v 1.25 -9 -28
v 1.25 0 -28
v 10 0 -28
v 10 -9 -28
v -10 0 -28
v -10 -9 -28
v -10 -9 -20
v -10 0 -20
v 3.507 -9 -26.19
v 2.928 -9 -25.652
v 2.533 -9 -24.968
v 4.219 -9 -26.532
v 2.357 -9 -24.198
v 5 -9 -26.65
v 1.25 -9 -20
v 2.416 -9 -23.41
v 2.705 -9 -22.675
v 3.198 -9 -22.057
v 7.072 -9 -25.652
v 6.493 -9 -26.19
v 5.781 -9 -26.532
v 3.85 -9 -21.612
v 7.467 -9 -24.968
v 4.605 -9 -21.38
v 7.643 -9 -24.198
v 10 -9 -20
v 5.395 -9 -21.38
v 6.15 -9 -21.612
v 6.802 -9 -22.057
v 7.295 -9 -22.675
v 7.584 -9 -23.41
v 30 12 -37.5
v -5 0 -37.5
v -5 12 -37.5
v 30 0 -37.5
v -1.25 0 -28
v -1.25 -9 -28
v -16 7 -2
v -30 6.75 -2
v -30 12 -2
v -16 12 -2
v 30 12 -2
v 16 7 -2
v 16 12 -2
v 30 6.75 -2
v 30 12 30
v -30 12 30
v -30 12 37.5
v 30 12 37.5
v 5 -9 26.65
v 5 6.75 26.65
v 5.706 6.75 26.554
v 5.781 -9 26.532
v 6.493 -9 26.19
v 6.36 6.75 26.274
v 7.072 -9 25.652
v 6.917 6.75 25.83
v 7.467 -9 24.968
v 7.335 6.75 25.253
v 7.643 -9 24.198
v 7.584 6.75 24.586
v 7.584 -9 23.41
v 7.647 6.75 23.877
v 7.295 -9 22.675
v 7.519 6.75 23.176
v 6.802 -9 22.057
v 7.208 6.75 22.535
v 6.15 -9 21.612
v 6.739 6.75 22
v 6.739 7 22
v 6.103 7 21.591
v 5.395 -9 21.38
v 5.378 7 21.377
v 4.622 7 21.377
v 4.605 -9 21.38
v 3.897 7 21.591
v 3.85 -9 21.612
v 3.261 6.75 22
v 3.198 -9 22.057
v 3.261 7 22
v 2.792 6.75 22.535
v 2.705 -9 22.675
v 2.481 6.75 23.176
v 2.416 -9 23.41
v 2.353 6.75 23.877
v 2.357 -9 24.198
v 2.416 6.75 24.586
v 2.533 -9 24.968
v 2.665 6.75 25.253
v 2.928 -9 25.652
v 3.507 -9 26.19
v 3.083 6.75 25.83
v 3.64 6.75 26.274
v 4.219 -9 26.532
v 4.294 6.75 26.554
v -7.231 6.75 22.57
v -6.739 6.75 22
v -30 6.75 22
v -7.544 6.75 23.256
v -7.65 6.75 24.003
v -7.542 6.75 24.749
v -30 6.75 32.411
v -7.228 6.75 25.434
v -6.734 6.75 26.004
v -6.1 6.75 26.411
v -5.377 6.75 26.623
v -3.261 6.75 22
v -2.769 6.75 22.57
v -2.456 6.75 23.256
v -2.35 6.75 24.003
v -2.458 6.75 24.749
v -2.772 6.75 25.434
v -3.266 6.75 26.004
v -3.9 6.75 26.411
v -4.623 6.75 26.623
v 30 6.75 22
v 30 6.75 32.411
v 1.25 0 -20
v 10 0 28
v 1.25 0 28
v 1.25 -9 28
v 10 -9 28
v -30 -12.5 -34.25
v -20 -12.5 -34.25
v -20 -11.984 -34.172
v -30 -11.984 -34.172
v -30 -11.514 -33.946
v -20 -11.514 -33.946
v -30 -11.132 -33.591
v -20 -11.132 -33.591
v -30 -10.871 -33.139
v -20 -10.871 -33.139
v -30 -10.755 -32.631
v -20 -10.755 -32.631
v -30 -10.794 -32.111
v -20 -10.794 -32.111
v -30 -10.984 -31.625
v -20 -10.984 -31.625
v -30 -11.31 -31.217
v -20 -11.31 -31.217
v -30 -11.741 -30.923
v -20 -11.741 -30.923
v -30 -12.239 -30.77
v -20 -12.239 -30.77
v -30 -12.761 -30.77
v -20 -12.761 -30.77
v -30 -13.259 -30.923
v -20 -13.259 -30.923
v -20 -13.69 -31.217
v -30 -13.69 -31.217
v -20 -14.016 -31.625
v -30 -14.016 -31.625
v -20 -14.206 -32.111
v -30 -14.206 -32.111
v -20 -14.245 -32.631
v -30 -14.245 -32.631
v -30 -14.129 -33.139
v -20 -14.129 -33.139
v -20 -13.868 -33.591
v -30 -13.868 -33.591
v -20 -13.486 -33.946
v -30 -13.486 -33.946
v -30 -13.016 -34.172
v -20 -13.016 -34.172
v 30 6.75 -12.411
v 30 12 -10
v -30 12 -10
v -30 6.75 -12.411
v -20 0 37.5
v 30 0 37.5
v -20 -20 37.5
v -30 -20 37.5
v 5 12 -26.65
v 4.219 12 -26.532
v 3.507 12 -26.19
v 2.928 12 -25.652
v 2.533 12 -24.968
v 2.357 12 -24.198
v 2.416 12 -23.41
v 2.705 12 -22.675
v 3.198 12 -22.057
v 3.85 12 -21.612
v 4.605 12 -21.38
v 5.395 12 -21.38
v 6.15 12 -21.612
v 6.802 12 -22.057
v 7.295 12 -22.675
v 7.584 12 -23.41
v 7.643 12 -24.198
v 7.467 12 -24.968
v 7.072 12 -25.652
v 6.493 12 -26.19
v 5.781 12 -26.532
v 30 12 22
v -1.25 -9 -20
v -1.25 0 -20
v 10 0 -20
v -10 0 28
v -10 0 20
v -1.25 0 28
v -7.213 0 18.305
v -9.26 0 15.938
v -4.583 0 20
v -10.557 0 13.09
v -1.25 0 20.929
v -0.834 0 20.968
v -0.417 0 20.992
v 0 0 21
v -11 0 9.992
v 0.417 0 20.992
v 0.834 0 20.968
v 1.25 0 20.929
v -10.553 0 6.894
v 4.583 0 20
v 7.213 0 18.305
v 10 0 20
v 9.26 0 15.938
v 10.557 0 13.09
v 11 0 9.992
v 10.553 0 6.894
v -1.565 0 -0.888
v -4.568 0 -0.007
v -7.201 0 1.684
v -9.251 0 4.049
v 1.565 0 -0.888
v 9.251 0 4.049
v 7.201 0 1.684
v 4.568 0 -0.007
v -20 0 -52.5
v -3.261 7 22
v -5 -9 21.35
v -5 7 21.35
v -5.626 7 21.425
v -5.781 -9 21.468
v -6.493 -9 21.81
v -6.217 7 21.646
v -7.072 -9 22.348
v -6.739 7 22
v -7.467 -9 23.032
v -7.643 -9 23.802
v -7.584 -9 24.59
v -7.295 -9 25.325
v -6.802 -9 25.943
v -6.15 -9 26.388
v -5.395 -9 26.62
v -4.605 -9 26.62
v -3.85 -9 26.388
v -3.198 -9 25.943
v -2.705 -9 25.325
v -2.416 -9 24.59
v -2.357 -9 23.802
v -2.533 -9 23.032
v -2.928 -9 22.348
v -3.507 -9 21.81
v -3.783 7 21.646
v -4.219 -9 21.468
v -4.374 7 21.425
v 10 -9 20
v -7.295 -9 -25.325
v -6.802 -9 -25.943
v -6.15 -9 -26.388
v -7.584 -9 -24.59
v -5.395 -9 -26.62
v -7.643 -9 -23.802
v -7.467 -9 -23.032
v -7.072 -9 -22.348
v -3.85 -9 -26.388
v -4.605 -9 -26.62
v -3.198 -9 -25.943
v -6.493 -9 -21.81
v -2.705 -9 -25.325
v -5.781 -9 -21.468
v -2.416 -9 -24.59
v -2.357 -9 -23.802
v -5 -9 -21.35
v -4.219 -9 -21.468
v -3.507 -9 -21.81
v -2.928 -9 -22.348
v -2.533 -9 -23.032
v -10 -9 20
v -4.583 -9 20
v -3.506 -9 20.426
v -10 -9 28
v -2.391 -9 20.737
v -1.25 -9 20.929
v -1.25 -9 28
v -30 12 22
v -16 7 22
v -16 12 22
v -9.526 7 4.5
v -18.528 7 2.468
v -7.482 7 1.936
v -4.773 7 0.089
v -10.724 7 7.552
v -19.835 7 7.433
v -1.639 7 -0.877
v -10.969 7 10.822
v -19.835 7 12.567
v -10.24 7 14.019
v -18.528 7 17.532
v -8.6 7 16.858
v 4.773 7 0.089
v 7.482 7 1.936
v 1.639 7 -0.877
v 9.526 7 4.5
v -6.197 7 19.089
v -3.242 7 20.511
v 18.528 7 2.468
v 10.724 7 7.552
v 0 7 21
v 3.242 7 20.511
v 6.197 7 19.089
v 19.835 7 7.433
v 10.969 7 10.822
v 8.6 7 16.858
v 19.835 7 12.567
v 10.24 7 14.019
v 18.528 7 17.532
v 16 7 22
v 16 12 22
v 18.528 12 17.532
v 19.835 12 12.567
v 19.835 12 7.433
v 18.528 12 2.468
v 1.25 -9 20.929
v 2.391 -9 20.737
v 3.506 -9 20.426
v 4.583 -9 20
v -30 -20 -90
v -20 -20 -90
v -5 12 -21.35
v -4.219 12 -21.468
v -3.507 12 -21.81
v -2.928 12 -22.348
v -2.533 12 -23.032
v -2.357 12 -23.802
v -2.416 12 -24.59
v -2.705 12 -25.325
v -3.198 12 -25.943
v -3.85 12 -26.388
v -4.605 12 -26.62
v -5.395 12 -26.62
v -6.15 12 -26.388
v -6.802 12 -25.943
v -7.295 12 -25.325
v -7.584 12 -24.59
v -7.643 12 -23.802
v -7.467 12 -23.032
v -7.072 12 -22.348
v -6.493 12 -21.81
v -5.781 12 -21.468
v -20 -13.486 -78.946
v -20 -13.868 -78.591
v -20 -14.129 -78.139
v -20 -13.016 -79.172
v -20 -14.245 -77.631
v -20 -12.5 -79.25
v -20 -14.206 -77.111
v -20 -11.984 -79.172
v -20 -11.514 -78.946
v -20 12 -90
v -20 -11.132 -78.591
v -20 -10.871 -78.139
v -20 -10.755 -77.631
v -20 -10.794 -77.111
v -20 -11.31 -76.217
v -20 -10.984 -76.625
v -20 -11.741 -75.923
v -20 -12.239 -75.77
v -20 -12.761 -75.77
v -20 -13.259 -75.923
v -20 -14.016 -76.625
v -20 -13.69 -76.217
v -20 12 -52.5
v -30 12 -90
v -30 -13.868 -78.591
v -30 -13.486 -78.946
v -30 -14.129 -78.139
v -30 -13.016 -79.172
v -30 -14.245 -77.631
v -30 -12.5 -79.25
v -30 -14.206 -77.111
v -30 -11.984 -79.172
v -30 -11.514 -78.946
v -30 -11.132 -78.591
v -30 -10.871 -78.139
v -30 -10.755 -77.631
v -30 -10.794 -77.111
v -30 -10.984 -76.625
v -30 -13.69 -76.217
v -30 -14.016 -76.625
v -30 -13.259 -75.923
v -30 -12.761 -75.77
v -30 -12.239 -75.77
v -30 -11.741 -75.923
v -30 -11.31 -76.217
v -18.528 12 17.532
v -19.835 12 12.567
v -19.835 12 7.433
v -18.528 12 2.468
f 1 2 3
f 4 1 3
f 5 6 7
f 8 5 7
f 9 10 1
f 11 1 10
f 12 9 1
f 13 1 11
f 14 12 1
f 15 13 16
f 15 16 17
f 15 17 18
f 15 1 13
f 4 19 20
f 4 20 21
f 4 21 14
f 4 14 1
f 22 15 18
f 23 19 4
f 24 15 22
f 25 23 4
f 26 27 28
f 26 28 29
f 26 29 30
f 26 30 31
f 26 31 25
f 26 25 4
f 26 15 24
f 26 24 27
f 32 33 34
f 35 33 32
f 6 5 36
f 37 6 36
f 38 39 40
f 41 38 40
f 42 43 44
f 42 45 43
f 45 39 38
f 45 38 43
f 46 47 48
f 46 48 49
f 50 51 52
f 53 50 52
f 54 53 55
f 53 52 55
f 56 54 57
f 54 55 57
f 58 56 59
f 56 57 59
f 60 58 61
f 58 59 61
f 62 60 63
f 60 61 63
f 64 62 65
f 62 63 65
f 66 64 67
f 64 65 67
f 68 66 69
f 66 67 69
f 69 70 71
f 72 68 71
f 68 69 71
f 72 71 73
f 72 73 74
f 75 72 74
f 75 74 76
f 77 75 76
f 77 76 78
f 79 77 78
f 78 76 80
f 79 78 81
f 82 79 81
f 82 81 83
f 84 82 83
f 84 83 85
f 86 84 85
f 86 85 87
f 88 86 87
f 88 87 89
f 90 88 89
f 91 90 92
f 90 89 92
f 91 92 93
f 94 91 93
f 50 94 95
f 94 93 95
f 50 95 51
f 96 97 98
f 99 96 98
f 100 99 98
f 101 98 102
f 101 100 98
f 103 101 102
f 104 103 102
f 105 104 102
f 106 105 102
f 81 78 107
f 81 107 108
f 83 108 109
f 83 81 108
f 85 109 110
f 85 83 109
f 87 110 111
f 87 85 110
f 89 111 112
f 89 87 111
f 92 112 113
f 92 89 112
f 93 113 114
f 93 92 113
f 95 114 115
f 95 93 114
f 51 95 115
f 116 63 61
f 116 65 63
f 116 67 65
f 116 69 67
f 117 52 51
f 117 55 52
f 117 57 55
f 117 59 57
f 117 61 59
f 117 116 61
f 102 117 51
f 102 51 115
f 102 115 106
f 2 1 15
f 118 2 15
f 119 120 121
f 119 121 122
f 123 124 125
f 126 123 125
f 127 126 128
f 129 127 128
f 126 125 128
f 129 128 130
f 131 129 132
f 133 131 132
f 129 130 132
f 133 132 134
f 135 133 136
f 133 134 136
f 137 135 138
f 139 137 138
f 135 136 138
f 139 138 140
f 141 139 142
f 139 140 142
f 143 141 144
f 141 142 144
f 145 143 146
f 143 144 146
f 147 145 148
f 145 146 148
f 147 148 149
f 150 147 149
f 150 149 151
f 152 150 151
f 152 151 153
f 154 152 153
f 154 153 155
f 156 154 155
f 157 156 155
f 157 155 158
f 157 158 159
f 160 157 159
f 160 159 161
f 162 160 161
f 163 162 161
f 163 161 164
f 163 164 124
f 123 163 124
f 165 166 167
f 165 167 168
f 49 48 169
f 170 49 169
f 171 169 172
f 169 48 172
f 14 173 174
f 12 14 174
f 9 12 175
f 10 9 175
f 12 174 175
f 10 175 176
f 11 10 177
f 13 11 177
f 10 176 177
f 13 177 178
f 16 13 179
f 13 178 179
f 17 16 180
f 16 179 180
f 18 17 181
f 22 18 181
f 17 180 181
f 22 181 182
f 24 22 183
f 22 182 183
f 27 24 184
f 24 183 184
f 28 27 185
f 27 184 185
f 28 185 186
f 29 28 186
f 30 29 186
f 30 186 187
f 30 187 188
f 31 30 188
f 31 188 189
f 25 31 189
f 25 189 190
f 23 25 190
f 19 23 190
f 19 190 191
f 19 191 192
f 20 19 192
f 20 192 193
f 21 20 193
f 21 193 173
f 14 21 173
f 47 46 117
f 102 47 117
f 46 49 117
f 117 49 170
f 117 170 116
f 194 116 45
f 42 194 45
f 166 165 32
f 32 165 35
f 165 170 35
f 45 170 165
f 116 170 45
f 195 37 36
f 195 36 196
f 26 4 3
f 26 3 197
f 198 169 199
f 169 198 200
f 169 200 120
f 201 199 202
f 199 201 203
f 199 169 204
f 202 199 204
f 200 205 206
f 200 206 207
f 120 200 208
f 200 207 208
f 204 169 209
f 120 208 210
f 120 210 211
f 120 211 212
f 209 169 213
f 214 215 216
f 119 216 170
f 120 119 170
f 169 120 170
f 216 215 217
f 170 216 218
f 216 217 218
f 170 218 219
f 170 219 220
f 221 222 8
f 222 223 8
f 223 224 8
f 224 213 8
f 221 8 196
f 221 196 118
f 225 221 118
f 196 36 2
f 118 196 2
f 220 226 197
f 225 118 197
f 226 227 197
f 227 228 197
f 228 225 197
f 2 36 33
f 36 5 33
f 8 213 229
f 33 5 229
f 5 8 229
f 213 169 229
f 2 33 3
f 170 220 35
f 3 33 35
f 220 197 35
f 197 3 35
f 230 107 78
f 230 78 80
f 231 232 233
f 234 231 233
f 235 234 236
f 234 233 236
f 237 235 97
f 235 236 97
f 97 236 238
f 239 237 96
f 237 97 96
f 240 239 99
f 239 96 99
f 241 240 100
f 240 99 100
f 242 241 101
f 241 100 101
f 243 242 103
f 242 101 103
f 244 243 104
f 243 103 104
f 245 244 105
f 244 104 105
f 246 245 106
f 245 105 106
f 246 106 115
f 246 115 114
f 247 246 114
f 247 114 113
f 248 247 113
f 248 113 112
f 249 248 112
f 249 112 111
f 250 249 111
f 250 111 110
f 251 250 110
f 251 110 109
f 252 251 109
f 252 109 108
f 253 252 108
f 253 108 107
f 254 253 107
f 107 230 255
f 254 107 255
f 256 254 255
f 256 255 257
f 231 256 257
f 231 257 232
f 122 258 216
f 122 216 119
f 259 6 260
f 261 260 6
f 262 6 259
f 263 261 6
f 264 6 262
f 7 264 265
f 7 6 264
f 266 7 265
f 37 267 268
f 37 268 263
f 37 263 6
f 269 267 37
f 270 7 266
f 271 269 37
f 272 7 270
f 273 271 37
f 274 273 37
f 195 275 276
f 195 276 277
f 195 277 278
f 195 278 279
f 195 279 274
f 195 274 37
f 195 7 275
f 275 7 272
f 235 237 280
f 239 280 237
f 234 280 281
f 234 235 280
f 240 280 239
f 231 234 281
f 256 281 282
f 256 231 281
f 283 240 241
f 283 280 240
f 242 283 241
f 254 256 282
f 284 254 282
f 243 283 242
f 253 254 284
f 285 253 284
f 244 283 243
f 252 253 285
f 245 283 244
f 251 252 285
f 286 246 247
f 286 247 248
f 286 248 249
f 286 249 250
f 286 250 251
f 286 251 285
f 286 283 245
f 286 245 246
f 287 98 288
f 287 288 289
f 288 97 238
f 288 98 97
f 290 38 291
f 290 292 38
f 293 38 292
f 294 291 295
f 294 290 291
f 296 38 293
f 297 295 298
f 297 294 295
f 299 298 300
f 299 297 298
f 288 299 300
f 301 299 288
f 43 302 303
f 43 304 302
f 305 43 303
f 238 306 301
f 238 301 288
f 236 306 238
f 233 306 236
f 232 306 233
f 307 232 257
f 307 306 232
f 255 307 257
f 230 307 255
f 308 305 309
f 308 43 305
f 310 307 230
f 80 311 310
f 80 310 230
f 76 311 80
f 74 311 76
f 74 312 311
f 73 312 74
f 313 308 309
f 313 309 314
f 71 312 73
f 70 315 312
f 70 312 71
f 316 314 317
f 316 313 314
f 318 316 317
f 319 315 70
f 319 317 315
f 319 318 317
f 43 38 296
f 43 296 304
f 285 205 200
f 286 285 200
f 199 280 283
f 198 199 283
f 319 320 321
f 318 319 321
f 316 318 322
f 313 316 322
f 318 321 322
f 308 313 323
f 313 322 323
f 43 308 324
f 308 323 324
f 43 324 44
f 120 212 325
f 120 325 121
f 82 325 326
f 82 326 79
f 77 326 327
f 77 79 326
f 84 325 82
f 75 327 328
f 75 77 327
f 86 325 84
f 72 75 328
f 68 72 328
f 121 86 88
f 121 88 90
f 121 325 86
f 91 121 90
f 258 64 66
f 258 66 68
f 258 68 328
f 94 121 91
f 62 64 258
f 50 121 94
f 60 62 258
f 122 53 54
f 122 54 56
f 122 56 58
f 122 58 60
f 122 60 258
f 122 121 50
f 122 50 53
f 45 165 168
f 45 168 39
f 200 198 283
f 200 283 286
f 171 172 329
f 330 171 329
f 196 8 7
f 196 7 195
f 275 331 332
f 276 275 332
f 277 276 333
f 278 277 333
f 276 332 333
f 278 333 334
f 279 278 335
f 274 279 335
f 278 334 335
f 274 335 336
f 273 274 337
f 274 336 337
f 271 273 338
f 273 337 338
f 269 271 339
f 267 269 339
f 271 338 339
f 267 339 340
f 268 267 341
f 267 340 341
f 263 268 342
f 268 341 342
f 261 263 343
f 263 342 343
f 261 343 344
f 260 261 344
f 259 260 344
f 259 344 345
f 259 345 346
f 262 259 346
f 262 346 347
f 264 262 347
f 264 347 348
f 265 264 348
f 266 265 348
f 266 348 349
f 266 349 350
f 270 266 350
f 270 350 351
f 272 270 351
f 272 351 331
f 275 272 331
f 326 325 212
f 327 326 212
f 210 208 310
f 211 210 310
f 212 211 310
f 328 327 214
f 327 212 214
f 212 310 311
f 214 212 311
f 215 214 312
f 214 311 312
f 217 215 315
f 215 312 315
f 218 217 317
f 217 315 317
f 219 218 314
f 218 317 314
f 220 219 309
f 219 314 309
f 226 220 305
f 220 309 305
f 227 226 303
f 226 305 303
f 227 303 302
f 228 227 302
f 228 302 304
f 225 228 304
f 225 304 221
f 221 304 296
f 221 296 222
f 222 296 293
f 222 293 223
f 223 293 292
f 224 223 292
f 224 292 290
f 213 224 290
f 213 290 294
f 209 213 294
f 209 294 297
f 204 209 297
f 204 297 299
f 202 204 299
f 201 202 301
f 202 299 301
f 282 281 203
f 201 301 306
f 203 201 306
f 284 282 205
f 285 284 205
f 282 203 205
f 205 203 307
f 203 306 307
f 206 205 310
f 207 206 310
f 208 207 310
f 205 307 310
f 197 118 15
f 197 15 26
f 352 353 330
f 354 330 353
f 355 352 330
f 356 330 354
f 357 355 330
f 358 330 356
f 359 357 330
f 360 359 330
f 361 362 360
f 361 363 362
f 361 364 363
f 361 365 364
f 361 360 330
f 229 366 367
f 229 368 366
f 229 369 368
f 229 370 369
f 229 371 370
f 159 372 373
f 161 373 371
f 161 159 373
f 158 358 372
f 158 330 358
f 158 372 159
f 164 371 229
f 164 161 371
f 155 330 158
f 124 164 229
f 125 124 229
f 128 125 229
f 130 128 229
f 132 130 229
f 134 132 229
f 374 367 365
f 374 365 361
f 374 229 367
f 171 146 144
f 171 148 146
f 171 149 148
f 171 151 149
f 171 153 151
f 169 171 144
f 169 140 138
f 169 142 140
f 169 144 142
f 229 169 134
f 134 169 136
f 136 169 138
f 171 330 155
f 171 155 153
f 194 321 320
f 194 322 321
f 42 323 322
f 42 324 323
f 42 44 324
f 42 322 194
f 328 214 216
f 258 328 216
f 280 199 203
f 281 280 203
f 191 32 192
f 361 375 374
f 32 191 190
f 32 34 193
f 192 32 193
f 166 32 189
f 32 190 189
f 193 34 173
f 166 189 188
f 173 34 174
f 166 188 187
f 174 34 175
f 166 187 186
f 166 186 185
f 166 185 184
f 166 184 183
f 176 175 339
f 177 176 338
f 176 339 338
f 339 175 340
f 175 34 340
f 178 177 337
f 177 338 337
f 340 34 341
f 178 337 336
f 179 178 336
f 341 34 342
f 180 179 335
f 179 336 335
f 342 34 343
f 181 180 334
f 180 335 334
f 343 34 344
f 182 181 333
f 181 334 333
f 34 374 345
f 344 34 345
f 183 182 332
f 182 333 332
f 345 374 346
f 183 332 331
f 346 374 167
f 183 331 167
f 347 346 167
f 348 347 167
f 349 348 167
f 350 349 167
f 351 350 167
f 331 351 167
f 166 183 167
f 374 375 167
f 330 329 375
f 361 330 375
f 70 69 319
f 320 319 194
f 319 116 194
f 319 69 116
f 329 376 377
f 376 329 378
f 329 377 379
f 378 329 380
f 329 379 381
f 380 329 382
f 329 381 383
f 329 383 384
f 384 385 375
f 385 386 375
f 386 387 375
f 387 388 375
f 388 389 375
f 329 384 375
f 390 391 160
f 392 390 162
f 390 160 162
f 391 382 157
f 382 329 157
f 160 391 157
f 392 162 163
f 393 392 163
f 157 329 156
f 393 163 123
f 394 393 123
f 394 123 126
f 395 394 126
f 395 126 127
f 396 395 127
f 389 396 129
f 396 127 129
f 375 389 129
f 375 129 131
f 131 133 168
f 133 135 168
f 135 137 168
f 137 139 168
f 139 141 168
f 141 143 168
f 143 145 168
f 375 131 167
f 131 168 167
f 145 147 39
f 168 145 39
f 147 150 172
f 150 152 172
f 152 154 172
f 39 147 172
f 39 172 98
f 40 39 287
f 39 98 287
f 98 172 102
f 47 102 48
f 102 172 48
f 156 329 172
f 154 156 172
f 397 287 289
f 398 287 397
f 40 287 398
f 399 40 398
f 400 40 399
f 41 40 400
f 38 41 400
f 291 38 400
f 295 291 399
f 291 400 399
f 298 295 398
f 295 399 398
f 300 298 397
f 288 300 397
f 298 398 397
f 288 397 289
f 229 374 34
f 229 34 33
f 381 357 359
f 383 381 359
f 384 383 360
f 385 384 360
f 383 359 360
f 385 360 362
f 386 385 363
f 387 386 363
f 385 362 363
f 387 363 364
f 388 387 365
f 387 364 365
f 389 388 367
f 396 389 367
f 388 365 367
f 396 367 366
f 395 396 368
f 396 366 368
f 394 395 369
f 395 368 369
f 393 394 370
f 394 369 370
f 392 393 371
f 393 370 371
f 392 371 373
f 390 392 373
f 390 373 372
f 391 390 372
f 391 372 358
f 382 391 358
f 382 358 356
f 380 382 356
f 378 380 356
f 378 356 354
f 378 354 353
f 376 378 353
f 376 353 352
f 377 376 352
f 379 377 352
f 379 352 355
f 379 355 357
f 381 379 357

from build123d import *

# Parameters (mm, degrees)
SKETCH1_W           = 60
SKETCH1_H           = 75
BOSS_EXTRUDE1_DEPTH = 12
SKETCH6_W           = 8.75
SKETCH6_H           = 8
BOSS_EXTRUDE2_DEPTH = 9
SKETCH3_R           = 2.65
SKETCH3_R_2         = 11
CUT_EXTRUDE4_DEPTH  = 53.414215629
SKETCH5_R           = 2.65
SKETCH5_R_2         = 11
CUT_EXTRUDE8_DEPTH  = 5
DOVE_CUT_DEPTH      = 58.447802395
DOVE_CUT_DEPTH_BACK = 58.447802395
BOSS_EXTRUDE3_DEPTH = 10
CHAMFER1_SIZE       = 15
SKETCH16_R          = 1.75
CUT_EXTRUDE9_DEPTH  = 105.880884817


with BuildPart() as part:
    # Sketch1 → Boss-Extrude1 (new body)
    with BuildSketch(Plane(origin=(0, 0, 0), x_dir=(1, 0, 0), z_dir=(0, 1, 0))):
        Rectangle(SKETCH1_W, SKETCH1_H)
    extrude(amount=BOSS_EXTRUDE1_DEPTH)

    # Sketch6 → Boss-Extrude2 (add)
    with BuildSketch(Plane.XZ):
        with Locations((-5.625, -24)):
            Rectangle(SKETCH6_W, SKETCH6_H)
        with Locations((5.625, -24)):
            Rectangle(SKETCH6_W, SKETCH6_H)
        with Locations((-5.625, 24)):
            Rectangle(SKETCH6_W, SKETCH6_H)
        with Locations((5.625, 24)):
            Rectangle(SKETCH6_W, SKETCH6_H)
    extrude(amount=BOSS_EXTRUDE2_DEPTH)

    # Sketch3 → Cut-Extrude4 (cut, through all)
    with BuildSketch(Plane(origin=(0, 12, 0), x_dir=(1, 0, 0), z_dir=(0, 1, 0))):
        with Locations((-5, 24)):
            Circle(SKETCH3_R)
        with Locations((5, 24)):
            Circle(SKETCH3_R)
        with Locations((5, -24)):
            Circle(SKETCH3_R)
        with Locations((-5, -24)):
            Circle(SKETCH3_R)
        with Locations((0, -10)):
            Circle(SKETCH3_R_2)
    extrude(amount=-CUT_EXTRUDE4_DEPTH, mode=Mode.SUBTRACT)

    # Sketch5 → Cut-Extrude8 (cut)
    with BuildSketch(Plane(origin=(0, 12, 0), x_dir=(1, 0, 0), z_dir=(0, 1, 0))):
        with BuildLine():
            ThreePointArc((10, -27.320508076), (17.320508076, -20), (20, -10))
            ThreePointArc((20, -10), (10, 7.320508076), (-10, 7.320508076))
            ThreePointArc((-10, 7.320508076), (-17.320508076, 0), (-20, -10))
            ThreePointArc((-20, -10), (-10, -27.320508076), (10, -27.320508076))
        make_face()
        with Locations((-5, -24)):
            Circle(SKETCH5_R, mode=Mode.SUBTRACT)
        with Locations((5, -24)):
            Circle(SKETCH5_R, mode=Mode.SUBTRACT)
        with Locations((0, -10)):
            Circle(SKETCH5_R_2, mode=Mode.SUBTRACT)
    extrude(amount=-CUT_EXTRUDE8_DEPTH, mode=Mode.SUBTRACT)

    # Sketch15 → Dove Cut (cut, two sides: drawn at the far end of the back side and taken through both)
    with BuildSketch(Plane(origin=(0, 0, 10), x_dir=(0, 0, 1), z_dir=(-1, 0, 0)).offset(-DOVE_CUT_DEPTH_BACK)):
        Polygon((-21.91084373, 6.75), (-12, 6.75), (-12, 12), (-20, 12), (-22.41084373, 6.75), align=None)
        Polygon((12, 12), (20, 12), (22.41084373, 6.75), (21.91084373, 6.75), (12, 6.75), align=None)
    extrude(amount=DOVE_CUT_DEPTH + DOVE_CUT_DEPTH_BACK, mode=Mode.SUBTRACT)

    # Sketch8 → Boss-Extrude3 (add)
    with BuildSketch(Plane(origin=(-30, 30, 0), x_dir=(0, 1, 0), z_dir=(1, 0, 0))):
        Polygon((-30, 37.5), (-50, 37.5), (-50, -90), (-30, -90), (-18, -90), (-18, -37.5), (-30, -37.5), align=None)
    extrude(amount=BOSS_EXTRUDE3_DEPTH)

    # Chamfer1
    chamfer1_edges = [part.edges().sort_by_distance(p)[0] for p in [
        (-20, 6, -37.5),
    ]]
    chamfer(chamfer1_edges, length=CHAMFER1_SIZE)

    # Sketch16 → Cut-Extrude9 (cut, through all)
    with BuildSketch(Plane(origin=(-20, 0, 0), x_dir=(0, 0, -1), z_dir=(1, 0, 0))):
        with Locations((77.5, -12.5)):
            Circle(SKETCH16_R)
        with Locations((32.5, -12.5)):
            Circle(SKETCH16_R)
    extrude(amount=-CUT_EXTRUDE9_DEPTH, mode=Mode.SUBTRACT)


solid = part.part
